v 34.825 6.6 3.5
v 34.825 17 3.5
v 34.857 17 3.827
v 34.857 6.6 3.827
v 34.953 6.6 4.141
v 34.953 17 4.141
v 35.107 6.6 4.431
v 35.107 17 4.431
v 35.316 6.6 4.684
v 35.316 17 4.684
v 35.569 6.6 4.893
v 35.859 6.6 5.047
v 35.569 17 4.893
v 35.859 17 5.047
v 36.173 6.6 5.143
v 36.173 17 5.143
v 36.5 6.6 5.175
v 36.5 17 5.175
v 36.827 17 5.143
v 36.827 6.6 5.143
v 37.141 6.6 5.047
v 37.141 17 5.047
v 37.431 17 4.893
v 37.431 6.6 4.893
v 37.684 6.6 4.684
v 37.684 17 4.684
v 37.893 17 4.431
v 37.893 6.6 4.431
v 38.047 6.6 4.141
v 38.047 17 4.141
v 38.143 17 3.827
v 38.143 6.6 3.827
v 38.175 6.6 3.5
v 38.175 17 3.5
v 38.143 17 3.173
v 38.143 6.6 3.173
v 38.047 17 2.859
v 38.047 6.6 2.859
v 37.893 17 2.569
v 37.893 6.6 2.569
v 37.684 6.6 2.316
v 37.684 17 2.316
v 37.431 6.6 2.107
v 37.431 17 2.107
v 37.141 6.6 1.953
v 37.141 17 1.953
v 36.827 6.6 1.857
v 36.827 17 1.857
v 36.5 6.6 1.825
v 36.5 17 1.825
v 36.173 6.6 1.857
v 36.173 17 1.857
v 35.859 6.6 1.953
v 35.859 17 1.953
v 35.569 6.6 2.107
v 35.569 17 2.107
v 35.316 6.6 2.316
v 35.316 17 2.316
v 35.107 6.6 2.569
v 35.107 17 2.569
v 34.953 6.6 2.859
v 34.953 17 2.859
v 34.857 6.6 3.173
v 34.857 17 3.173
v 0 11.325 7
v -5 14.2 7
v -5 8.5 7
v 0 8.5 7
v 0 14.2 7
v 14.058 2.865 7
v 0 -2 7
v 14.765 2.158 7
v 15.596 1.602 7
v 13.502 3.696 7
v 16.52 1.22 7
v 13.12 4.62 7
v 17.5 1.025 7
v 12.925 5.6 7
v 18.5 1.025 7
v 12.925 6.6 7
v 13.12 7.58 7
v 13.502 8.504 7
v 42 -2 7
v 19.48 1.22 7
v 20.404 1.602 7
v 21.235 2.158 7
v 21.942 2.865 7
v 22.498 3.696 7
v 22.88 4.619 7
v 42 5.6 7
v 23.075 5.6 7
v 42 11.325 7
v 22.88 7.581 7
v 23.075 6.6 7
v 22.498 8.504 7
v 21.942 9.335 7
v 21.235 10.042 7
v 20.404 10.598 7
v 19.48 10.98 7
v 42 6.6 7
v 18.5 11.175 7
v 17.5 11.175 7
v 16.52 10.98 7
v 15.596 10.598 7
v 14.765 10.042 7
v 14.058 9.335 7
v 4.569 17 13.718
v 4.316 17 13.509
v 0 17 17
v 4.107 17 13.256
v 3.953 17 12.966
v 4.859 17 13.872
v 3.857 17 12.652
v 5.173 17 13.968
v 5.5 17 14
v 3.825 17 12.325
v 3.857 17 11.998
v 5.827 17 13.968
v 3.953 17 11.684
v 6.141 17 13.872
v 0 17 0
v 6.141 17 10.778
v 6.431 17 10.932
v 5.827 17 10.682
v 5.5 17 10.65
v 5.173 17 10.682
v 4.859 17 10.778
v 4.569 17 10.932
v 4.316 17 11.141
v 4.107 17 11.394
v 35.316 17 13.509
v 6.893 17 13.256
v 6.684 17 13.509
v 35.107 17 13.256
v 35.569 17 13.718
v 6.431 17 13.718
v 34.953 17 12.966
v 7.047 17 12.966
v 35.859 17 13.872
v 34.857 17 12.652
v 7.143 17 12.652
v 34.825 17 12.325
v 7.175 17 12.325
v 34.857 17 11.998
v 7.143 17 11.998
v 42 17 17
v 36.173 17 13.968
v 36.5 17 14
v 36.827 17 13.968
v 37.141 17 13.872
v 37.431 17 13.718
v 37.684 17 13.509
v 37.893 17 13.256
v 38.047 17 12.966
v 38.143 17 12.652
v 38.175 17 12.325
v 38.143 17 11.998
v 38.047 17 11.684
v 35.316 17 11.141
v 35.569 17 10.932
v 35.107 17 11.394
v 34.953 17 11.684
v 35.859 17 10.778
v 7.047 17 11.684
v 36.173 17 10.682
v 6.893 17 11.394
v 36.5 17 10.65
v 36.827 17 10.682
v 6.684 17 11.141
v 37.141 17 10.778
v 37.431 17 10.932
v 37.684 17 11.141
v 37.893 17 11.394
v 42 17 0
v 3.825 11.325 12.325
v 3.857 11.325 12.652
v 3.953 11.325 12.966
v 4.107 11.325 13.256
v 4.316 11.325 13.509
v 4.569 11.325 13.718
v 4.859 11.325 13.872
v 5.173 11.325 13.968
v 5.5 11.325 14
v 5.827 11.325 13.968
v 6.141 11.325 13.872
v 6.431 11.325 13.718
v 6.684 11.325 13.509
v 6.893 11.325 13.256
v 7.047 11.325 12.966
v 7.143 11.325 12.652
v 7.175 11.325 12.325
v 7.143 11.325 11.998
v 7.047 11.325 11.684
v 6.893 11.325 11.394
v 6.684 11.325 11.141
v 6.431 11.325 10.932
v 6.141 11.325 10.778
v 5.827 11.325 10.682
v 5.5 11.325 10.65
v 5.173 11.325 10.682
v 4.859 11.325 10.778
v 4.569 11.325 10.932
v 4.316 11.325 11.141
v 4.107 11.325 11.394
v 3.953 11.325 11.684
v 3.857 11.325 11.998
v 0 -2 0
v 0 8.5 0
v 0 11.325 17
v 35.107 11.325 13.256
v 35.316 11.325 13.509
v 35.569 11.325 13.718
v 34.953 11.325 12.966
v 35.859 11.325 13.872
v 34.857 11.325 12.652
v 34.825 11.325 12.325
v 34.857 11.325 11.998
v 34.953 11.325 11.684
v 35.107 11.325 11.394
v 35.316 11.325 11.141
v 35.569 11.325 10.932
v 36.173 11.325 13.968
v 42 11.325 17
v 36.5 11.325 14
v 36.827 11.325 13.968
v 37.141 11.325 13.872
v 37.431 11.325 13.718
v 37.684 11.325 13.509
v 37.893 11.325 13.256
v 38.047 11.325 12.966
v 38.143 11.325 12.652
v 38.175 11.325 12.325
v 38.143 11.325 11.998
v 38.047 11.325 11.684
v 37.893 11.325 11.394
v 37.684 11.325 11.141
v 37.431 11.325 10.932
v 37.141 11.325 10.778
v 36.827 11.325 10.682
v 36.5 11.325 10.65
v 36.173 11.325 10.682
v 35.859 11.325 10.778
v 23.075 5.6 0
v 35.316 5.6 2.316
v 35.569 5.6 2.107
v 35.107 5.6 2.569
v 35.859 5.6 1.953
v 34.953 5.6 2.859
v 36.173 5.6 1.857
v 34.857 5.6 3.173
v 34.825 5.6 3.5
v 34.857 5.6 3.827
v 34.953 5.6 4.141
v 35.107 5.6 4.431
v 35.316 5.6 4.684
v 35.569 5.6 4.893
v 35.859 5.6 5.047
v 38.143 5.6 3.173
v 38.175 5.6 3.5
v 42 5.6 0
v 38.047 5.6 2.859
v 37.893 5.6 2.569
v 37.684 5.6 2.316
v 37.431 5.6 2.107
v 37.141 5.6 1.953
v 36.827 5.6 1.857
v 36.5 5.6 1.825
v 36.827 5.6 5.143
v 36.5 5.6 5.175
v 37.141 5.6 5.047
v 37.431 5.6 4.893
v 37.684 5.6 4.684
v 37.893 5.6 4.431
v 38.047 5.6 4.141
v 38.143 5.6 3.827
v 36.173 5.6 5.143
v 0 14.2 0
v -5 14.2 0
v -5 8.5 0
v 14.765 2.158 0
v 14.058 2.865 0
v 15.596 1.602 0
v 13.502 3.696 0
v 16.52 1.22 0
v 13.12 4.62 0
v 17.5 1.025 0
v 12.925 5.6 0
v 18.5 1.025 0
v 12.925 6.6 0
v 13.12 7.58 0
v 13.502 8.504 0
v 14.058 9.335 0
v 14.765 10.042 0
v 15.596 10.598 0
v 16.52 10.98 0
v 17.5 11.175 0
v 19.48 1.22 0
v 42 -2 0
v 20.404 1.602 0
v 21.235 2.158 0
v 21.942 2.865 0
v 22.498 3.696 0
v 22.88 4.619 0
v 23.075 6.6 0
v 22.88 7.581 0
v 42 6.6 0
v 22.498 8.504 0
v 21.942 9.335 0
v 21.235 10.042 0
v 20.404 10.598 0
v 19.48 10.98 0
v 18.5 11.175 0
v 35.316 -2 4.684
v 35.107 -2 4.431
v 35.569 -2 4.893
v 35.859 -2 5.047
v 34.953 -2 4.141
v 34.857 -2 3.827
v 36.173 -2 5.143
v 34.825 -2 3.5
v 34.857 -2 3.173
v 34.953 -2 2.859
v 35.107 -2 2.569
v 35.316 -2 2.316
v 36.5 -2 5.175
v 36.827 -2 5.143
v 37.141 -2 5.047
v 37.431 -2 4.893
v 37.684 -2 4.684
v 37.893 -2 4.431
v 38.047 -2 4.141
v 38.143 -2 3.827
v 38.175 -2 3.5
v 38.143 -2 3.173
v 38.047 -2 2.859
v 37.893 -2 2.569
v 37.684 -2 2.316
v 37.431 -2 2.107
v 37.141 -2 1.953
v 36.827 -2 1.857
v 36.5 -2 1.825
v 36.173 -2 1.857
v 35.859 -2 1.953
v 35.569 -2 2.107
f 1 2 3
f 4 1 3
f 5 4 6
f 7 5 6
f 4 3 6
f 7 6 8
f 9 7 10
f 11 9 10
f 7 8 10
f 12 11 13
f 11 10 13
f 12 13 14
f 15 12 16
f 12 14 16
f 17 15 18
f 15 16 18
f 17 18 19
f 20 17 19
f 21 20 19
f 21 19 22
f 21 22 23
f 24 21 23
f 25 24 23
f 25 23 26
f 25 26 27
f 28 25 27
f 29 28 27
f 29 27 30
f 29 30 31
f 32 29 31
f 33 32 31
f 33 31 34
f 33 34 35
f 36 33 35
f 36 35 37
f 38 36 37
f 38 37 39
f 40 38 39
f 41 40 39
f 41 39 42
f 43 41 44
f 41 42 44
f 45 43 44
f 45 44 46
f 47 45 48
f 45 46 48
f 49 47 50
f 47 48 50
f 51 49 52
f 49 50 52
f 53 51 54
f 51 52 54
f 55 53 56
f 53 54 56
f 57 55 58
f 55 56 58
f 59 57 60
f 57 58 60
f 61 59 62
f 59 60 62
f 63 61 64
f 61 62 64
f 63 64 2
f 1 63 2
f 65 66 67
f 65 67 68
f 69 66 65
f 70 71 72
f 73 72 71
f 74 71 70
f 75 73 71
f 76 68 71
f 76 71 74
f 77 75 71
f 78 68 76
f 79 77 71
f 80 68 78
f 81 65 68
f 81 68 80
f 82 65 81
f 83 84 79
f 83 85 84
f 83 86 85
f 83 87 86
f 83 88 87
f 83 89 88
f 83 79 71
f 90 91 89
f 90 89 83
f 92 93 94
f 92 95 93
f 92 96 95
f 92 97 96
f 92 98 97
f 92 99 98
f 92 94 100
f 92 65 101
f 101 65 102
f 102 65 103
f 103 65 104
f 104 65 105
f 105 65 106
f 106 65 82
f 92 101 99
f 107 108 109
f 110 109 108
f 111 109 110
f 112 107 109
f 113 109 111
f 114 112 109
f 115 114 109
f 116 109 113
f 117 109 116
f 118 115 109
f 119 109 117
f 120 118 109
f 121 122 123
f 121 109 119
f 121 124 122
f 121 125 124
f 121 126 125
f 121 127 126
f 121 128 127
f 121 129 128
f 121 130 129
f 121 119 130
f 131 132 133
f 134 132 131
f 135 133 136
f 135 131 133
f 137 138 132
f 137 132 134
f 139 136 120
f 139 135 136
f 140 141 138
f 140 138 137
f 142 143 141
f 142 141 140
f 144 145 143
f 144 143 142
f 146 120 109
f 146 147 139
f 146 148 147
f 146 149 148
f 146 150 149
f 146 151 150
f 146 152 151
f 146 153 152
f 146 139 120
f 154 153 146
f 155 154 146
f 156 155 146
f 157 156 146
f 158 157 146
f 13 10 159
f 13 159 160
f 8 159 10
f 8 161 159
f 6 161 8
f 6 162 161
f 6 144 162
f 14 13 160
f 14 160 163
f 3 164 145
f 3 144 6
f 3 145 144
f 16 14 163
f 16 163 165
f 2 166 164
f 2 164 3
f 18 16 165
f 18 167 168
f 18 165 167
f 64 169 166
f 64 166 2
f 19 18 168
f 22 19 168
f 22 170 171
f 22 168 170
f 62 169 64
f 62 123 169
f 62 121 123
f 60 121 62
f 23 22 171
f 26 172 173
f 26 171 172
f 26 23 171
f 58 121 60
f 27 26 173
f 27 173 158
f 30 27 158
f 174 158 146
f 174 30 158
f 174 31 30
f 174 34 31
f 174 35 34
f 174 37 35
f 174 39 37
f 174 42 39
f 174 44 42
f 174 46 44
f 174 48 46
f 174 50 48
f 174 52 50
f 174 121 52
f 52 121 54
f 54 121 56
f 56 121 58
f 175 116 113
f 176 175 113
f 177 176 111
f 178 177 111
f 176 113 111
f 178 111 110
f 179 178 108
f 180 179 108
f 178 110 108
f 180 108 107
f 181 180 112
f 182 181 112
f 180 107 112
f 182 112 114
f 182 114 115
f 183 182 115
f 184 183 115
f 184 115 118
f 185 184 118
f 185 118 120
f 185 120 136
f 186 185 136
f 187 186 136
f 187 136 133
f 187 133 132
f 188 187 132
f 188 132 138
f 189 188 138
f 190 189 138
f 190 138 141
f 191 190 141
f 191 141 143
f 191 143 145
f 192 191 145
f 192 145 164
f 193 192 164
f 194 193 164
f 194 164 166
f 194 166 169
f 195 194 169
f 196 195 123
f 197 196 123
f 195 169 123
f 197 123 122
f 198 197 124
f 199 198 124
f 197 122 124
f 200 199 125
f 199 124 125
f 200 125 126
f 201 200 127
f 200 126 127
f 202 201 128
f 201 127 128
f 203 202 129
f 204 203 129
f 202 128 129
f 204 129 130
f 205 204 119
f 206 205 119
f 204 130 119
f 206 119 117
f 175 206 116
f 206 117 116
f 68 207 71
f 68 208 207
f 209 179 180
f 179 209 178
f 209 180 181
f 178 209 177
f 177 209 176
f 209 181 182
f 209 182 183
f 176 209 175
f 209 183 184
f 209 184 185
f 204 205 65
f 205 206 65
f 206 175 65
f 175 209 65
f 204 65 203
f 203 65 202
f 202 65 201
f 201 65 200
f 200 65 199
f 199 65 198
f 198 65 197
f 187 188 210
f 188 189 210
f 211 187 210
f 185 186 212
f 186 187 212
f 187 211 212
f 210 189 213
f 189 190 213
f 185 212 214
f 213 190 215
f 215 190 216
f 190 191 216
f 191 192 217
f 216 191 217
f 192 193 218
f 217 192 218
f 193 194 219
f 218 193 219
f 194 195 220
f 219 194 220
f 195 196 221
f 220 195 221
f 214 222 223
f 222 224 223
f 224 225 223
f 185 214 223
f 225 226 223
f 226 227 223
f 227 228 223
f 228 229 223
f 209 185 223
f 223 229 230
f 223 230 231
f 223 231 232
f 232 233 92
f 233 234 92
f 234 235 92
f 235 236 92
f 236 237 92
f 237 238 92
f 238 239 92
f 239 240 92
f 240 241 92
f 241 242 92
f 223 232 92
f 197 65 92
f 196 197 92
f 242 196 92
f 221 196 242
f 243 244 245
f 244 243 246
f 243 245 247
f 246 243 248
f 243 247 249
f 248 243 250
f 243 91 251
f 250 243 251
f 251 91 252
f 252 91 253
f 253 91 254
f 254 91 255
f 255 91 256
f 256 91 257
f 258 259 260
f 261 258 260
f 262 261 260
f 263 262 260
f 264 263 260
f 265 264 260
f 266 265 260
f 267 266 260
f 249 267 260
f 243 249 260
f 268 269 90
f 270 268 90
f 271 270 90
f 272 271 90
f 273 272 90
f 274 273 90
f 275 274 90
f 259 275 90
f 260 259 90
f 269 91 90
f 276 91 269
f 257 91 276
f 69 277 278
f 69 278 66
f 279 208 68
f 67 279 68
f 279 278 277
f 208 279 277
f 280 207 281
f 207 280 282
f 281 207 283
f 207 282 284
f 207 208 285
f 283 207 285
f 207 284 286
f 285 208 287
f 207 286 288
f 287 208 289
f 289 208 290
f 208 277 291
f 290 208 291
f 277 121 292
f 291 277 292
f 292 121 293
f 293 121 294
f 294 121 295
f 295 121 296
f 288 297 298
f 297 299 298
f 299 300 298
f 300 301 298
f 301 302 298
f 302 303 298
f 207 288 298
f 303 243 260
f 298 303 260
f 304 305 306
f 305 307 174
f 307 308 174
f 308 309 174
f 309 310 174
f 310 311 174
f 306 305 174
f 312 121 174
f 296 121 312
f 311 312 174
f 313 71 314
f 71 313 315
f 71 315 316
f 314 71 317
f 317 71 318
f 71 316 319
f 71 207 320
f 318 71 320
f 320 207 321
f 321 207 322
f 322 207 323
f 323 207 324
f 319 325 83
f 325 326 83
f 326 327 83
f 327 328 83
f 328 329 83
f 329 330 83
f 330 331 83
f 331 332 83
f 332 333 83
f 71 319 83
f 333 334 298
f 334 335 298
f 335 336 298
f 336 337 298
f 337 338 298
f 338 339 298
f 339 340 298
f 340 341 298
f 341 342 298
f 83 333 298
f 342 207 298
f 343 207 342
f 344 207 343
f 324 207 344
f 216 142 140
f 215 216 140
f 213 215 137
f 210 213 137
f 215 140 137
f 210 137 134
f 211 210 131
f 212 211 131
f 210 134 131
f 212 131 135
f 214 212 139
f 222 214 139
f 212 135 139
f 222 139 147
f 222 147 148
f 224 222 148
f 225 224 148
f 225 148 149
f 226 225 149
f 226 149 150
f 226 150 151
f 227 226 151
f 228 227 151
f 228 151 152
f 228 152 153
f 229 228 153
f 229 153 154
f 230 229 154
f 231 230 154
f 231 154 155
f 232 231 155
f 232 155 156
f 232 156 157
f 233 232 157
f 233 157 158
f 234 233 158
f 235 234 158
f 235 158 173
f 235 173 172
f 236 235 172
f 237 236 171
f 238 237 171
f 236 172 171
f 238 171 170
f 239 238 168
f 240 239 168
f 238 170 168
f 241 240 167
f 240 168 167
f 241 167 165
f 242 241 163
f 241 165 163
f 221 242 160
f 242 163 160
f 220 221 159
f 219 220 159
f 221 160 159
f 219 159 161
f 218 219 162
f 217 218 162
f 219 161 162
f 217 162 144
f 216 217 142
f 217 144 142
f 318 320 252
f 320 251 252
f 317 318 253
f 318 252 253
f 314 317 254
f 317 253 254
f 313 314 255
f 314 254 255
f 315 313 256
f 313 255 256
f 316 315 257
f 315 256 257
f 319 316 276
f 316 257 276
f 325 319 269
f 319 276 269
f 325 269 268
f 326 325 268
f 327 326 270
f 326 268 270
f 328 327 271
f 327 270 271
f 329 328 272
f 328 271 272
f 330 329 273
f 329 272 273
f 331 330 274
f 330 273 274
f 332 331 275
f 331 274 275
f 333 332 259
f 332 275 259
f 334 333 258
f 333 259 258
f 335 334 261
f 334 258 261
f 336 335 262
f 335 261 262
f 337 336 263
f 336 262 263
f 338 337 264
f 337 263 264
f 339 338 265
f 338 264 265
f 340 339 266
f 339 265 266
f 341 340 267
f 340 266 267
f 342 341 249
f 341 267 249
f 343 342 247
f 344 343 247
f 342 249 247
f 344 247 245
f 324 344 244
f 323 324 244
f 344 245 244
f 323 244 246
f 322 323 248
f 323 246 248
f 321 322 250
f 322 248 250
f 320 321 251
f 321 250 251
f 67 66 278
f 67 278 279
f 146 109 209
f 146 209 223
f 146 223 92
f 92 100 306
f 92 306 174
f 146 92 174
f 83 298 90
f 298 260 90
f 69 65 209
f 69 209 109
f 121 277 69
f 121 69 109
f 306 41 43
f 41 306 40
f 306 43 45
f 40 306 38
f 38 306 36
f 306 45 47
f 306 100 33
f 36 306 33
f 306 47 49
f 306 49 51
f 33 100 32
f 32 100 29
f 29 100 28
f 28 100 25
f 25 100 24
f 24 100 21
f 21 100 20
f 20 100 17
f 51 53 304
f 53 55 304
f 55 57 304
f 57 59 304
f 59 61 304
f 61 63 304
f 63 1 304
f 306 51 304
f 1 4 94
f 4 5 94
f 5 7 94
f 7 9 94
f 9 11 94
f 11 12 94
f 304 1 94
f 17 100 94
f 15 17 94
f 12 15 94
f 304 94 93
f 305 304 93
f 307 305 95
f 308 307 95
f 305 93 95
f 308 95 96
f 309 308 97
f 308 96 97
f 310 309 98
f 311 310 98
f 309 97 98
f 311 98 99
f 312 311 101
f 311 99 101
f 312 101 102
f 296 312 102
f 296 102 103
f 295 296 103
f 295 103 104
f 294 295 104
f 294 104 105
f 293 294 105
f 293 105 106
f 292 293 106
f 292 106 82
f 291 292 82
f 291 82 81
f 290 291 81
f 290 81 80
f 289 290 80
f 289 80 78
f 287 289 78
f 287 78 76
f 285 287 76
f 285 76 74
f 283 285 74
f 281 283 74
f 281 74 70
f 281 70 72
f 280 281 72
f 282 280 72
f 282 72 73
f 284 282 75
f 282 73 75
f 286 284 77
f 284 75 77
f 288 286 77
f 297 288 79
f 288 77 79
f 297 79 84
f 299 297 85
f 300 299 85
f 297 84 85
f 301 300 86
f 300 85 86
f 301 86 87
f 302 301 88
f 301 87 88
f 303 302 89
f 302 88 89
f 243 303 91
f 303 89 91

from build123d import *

# Parameters (mm, degrees)
F0_W      = 42
F0_H      = 17
F1_DEPTH  = 7
F4_DEPTH  = 25
F5_W      = 42
F5_H      = 5.6745335534
F6_DEPTH  = 10
F7_R      = 1.675
F8_DEPTH  = 25
F9_DEPTH  = 25
F10_W     = 5.7
F10_H     = 7
F11_DEPTH = 5
F12_DEPTH = 2


with BuildPart() as f1:
    # F0 (on Top) → F1 (new body)
    with BuildSketch(Plane.XY):
        with Locations((21, 8.5)):
            Rectangle(F0_W, F0_H)
    extrude(amount=F1_DEPTH)

    # F3 (on face) → F4 (cut)
    with BuildSketch(Plane(origin=(0, 17, 0), x_dir=(-1, 0, 0), z_dir=(0, 1, 0))):
        with BuildLine():
            ThreePointArc((-38.175, 3.5), (-36.5, 1.825), (-34.825, 3.5))
            ThreePointArc((-34.825, 3.5), (-36.5, 5.175), (-38.175, 3.5))
        make_face()
    extrude(amount=-F4_DEPTH, mode=Mode.SUBTRACT)

    # F5 (on face) → F6 (join)
    with BuildSketch(Plane.XY.offset(7)):
        with Locations((21, 14.1627332233)):
            Rectangle(F5_W, F5_H)
    extrude(amount=F6_DEPTH)

    # F7 (on face) → F8 (cut)
    with BuildSketch(Plane(origin=(0, 17, 0), x_dir=(-1, 0, 0), z_dir=(0, 1, 0))):
        with Locations((-36.5, 12.325)):
            Circle(F7_R)
        with Locations((-5.5, 12.325)):
            Circle(F7_R)
    extrude(amount=-F8_DEPTH, mode=Mode.SUBTRACT)

    # F2 (on face) → F9 (cut)
    with BuildSketch(Plane.XY.offset(7)):
        with BuildLine():
            ThreePointArc((23.0754310162, 5.6), (23.0938540508, 5.8496983645), (23.1, 6.1))
            ThreePointArc((23.1, 6.1), (23.0938540508, 6.3503016355), (23.0754310162, 6.6))
            ThreePointArc((23.0754310162, 6.6), (12.9, 6.1), (23.0754310162, 5.6))
        make_face()
        with BuildLine():
            Line((42, 6.1), (23.1, 6.1))
            ThreePointArc((23.1, 6.1), (23.0938540508, 5.8496983645), (23.0754310162, 5.6))
            Line((23.0754310162, 5.6), (42, 5.6))
            Line((42, 5.6), (42, 6.1))
        make_face()
        with BuildLine():
            ThreePointArc((23.0754310162, 6.6), (23.0938540508, 6.3503016355), (23.1, 6.1))
            Line((23.1, 6.1), (42, 6.1))
            Line((42, 6.1), (42, 6.6))
            Line((42, 6.6), (23.0754310162, 6.6))
        make_face()
    extrude(amount=-F9_DEPTH, mode=Mode.SUBTRACT)

    # F10 (on face) → F11 (join)
    with BuildSketch(Plane(origin=(0, 0, 0), x_dir=(0, -1, 0), z_dir=(-1, 0, 0))):
        with Locations((-11.35, 3.5)):
            Rectangle(F10_W, F10_H)
    extrude(amount=F11_DEPTH)

    # F12 (add): a face of the model
    f12_faces = [f1.faces().sort_by_distance(p)[0] for p in [
        (20.5209474116, 0, 3.5),
    ]]
    extrude(f12_faces, amount=F12_DEPTH)


solid = f1.part
